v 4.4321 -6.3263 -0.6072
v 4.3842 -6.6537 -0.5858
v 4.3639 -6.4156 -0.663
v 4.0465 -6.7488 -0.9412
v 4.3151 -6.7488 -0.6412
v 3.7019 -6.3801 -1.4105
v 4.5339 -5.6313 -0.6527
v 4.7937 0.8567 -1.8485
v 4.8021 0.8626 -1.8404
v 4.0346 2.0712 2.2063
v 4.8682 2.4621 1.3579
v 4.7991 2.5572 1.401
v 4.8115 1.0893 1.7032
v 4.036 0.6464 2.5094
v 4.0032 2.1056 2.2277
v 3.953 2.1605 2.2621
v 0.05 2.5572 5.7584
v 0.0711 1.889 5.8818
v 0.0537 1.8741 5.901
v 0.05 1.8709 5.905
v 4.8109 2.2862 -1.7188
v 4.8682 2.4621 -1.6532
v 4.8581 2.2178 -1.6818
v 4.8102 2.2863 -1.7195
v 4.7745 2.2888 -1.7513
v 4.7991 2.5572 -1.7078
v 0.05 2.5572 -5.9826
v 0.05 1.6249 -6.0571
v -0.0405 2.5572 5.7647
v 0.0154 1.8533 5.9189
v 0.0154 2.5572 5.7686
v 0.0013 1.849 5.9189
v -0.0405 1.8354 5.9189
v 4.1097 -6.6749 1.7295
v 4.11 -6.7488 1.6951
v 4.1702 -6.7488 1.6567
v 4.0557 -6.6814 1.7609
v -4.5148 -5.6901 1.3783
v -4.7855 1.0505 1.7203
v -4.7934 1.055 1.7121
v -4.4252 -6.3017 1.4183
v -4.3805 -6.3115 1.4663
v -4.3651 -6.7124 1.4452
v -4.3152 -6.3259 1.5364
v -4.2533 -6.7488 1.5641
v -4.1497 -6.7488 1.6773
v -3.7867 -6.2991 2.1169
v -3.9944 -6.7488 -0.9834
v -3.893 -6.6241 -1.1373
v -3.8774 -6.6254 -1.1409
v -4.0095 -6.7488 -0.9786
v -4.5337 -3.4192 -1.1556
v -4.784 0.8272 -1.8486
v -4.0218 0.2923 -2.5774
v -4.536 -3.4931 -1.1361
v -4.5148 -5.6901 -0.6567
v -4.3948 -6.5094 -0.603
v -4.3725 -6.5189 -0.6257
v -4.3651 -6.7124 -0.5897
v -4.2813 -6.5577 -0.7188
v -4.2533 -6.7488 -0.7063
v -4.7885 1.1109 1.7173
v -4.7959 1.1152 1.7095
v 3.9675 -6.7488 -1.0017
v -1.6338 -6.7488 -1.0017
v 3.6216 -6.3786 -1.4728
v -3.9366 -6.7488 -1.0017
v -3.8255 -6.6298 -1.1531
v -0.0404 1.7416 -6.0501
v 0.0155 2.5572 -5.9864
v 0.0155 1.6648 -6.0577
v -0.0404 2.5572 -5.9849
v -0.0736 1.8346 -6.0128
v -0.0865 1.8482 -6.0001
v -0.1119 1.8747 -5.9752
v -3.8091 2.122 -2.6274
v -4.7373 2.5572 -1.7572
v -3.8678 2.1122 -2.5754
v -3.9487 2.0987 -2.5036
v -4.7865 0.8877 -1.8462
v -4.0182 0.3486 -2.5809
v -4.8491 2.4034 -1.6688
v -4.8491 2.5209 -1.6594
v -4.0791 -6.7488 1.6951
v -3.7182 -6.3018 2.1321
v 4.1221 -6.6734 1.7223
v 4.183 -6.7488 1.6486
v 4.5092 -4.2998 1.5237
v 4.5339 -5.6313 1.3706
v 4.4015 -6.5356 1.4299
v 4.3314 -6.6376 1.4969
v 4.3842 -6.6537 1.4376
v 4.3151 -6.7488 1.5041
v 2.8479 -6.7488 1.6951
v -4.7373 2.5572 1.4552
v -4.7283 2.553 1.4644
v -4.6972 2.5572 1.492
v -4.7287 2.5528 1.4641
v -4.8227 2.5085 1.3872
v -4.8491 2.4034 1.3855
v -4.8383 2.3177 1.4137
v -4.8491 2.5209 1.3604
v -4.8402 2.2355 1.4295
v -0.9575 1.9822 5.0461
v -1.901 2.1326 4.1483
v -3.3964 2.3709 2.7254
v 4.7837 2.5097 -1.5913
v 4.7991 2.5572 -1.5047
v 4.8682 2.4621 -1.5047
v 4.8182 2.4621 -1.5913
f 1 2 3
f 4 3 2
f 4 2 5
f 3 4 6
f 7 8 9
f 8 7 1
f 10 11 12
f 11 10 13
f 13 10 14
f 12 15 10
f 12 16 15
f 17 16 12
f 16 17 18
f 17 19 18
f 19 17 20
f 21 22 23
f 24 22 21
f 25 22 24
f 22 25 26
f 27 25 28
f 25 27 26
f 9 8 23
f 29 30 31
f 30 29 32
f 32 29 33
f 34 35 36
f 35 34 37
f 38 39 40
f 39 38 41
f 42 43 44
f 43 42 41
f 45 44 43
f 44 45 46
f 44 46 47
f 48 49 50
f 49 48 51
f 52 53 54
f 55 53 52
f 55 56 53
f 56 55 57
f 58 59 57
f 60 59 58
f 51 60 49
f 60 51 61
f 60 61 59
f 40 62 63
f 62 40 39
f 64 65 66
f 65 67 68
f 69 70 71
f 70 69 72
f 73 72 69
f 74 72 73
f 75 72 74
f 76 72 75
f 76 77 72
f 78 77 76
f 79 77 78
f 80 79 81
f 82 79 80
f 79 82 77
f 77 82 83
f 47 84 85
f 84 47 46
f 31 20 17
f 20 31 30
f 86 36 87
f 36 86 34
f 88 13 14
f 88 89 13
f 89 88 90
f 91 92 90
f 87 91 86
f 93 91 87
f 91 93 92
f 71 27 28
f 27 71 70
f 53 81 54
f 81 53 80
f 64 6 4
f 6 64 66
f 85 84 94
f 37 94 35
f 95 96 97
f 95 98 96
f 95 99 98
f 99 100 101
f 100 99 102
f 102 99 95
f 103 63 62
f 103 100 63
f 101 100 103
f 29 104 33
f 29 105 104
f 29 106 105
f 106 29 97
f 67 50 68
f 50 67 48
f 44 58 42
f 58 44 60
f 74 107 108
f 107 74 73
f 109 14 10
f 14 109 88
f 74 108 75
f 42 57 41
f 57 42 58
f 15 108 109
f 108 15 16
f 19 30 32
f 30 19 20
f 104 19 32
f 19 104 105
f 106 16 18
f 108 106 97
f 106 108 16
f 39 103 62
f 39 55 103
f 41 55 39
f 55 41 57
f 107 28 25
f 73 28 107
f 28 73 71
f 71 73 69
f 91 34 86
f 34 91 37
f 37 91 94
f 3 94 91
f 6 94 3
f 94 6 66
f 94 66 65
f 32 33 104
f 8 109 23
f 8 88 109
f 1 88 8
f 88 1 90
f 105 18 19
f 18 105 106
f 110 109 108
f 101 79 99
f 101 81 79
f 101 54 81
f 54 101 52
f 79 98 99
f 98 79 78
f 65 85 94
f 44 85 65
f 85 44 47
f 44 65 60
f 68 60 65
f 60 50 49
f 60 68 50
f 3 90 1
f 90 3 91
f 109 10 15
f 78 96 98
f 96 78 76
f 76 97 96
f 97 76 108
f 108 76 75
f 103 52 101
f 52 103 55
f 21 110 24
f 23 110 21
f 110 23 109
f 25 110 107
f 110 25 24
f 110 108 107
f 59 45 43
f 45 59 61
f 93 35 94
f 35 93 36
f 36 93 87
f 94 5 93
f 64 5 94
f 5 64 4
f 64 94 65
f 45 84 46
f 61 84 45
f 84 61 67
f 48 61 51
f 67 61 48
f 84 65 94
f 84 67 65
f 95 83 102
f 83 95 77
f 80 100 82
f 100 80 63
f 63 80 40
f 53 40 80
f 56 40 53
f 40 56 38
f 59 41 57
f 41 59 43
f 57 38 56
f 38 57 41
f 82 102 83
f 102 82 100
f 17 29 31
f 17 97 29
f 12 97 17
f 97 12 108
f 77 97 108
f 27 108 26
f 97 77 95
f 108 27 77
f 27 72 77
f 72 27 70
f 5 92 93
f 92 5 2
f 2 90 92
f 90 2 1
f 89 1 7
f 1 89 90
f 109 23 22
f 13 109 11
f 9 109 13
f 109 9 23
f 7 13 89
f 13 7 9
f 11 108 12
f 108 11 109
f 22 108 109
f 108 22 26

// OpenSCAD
// Auto-generated OpenSCAD file

    inner_points = 10*[[-0.44338942496134576, -0.5631291440797384, 0.736853897056677], [0.258799636920154, 0.14397761227363534, 0.8201038609809336], [-0.25879980510935924, 0.14397747926995844, -0.8201039287466986], [0.44338919068963584, -0.5631293267497549, -0.7368538292909121], [-0.4284186803233596, -0.6653657601513122, -0.2577935536208068], [0.47682137191431595, 0.24621402912054582, -0.1504703186366988], [-0.47682153054903015, 0.24621410252250395, 0.15047023127520603], [0.42841843649715877, -0.6653657507776369, 0.25779364098229957]];

    outer_points = 10*[[0.4999998558605856, -0.7822559369703687, 0.051219988111338946], [-0.5000001441354547, -0.7822559369703687, 0.05121717394836035], [1.5482124809305407e-06, 0.7495881473432447, -0.5501502552287388], [-1.259937611829569e-06, 0.8149237265974926, 0.4477130931690396], [0.6445843110171734, 0.20512235240503623, -0.01342867001218147], [-0.6445842354260318, 0.20512235240503623, -0.013432297942578041], [1.7722938158523331e-06, -0.2472366392743148, -0.629776537226624], [-1.8478849574399043e-06, -0.16300806553575767, 0.6566375051813835]];

    // Convex hull for inner set (I)
    module inner_hull() {
        hull() {
            for (p = inner_points) {
                translate(p) sphere(r=0.1);
            }
        }
    }

    // Convex hull for outer set (O) minus inner hull (O \ I)
    module outer_minus_inner() {
        difference() {
            hull() {
                for (p = outer_points) {
                    translate(p) sphere(r=0.1);
                }
            }
            inner_hull(); // Subtract inner hull
        }
    }

    // Convex hull for outer set (O) minus all translated inner hulls
    module outer_minus_AllTranslationInner() {
        difference() {
            hull() {
                for (p = outer_points) {
                    translate(p) sphere(r=0.1);
                }
            }
            hull() {
                translate([0,0,50]) inner_hull();
                translate([0,0,-50]) inner_hull();
            }; // Subtract translated inner hulls
        }
    }

    // Difference between outer_minus_inner and outer_minus_AllTranslationInner
    module outer_minus_inner_diff() {
        difference() {
            // Outer minus inner
            difference() {
                hull() {
                    for (p = outer_points) {
                        translate(p) sphere(r=0.1);
                    }
                }
                inner_hull();
            }

            // Subtract Outer minus AllTranslationInner
            difference() {
                hull() {
                    for (p = outer_points) {
                        translate(p) sphere(r=0.1);
                    }
                }
                hull() {
                    translate([0,0,50]) inner_hull();
                    translate([0,0,-50]) inner_hull();
                };
            }
        }
    }

    // Rendering all with colors applied
    color([1, 1, 0, 1]) outer_minus_inner_diff(); // Opaque yellow
    
